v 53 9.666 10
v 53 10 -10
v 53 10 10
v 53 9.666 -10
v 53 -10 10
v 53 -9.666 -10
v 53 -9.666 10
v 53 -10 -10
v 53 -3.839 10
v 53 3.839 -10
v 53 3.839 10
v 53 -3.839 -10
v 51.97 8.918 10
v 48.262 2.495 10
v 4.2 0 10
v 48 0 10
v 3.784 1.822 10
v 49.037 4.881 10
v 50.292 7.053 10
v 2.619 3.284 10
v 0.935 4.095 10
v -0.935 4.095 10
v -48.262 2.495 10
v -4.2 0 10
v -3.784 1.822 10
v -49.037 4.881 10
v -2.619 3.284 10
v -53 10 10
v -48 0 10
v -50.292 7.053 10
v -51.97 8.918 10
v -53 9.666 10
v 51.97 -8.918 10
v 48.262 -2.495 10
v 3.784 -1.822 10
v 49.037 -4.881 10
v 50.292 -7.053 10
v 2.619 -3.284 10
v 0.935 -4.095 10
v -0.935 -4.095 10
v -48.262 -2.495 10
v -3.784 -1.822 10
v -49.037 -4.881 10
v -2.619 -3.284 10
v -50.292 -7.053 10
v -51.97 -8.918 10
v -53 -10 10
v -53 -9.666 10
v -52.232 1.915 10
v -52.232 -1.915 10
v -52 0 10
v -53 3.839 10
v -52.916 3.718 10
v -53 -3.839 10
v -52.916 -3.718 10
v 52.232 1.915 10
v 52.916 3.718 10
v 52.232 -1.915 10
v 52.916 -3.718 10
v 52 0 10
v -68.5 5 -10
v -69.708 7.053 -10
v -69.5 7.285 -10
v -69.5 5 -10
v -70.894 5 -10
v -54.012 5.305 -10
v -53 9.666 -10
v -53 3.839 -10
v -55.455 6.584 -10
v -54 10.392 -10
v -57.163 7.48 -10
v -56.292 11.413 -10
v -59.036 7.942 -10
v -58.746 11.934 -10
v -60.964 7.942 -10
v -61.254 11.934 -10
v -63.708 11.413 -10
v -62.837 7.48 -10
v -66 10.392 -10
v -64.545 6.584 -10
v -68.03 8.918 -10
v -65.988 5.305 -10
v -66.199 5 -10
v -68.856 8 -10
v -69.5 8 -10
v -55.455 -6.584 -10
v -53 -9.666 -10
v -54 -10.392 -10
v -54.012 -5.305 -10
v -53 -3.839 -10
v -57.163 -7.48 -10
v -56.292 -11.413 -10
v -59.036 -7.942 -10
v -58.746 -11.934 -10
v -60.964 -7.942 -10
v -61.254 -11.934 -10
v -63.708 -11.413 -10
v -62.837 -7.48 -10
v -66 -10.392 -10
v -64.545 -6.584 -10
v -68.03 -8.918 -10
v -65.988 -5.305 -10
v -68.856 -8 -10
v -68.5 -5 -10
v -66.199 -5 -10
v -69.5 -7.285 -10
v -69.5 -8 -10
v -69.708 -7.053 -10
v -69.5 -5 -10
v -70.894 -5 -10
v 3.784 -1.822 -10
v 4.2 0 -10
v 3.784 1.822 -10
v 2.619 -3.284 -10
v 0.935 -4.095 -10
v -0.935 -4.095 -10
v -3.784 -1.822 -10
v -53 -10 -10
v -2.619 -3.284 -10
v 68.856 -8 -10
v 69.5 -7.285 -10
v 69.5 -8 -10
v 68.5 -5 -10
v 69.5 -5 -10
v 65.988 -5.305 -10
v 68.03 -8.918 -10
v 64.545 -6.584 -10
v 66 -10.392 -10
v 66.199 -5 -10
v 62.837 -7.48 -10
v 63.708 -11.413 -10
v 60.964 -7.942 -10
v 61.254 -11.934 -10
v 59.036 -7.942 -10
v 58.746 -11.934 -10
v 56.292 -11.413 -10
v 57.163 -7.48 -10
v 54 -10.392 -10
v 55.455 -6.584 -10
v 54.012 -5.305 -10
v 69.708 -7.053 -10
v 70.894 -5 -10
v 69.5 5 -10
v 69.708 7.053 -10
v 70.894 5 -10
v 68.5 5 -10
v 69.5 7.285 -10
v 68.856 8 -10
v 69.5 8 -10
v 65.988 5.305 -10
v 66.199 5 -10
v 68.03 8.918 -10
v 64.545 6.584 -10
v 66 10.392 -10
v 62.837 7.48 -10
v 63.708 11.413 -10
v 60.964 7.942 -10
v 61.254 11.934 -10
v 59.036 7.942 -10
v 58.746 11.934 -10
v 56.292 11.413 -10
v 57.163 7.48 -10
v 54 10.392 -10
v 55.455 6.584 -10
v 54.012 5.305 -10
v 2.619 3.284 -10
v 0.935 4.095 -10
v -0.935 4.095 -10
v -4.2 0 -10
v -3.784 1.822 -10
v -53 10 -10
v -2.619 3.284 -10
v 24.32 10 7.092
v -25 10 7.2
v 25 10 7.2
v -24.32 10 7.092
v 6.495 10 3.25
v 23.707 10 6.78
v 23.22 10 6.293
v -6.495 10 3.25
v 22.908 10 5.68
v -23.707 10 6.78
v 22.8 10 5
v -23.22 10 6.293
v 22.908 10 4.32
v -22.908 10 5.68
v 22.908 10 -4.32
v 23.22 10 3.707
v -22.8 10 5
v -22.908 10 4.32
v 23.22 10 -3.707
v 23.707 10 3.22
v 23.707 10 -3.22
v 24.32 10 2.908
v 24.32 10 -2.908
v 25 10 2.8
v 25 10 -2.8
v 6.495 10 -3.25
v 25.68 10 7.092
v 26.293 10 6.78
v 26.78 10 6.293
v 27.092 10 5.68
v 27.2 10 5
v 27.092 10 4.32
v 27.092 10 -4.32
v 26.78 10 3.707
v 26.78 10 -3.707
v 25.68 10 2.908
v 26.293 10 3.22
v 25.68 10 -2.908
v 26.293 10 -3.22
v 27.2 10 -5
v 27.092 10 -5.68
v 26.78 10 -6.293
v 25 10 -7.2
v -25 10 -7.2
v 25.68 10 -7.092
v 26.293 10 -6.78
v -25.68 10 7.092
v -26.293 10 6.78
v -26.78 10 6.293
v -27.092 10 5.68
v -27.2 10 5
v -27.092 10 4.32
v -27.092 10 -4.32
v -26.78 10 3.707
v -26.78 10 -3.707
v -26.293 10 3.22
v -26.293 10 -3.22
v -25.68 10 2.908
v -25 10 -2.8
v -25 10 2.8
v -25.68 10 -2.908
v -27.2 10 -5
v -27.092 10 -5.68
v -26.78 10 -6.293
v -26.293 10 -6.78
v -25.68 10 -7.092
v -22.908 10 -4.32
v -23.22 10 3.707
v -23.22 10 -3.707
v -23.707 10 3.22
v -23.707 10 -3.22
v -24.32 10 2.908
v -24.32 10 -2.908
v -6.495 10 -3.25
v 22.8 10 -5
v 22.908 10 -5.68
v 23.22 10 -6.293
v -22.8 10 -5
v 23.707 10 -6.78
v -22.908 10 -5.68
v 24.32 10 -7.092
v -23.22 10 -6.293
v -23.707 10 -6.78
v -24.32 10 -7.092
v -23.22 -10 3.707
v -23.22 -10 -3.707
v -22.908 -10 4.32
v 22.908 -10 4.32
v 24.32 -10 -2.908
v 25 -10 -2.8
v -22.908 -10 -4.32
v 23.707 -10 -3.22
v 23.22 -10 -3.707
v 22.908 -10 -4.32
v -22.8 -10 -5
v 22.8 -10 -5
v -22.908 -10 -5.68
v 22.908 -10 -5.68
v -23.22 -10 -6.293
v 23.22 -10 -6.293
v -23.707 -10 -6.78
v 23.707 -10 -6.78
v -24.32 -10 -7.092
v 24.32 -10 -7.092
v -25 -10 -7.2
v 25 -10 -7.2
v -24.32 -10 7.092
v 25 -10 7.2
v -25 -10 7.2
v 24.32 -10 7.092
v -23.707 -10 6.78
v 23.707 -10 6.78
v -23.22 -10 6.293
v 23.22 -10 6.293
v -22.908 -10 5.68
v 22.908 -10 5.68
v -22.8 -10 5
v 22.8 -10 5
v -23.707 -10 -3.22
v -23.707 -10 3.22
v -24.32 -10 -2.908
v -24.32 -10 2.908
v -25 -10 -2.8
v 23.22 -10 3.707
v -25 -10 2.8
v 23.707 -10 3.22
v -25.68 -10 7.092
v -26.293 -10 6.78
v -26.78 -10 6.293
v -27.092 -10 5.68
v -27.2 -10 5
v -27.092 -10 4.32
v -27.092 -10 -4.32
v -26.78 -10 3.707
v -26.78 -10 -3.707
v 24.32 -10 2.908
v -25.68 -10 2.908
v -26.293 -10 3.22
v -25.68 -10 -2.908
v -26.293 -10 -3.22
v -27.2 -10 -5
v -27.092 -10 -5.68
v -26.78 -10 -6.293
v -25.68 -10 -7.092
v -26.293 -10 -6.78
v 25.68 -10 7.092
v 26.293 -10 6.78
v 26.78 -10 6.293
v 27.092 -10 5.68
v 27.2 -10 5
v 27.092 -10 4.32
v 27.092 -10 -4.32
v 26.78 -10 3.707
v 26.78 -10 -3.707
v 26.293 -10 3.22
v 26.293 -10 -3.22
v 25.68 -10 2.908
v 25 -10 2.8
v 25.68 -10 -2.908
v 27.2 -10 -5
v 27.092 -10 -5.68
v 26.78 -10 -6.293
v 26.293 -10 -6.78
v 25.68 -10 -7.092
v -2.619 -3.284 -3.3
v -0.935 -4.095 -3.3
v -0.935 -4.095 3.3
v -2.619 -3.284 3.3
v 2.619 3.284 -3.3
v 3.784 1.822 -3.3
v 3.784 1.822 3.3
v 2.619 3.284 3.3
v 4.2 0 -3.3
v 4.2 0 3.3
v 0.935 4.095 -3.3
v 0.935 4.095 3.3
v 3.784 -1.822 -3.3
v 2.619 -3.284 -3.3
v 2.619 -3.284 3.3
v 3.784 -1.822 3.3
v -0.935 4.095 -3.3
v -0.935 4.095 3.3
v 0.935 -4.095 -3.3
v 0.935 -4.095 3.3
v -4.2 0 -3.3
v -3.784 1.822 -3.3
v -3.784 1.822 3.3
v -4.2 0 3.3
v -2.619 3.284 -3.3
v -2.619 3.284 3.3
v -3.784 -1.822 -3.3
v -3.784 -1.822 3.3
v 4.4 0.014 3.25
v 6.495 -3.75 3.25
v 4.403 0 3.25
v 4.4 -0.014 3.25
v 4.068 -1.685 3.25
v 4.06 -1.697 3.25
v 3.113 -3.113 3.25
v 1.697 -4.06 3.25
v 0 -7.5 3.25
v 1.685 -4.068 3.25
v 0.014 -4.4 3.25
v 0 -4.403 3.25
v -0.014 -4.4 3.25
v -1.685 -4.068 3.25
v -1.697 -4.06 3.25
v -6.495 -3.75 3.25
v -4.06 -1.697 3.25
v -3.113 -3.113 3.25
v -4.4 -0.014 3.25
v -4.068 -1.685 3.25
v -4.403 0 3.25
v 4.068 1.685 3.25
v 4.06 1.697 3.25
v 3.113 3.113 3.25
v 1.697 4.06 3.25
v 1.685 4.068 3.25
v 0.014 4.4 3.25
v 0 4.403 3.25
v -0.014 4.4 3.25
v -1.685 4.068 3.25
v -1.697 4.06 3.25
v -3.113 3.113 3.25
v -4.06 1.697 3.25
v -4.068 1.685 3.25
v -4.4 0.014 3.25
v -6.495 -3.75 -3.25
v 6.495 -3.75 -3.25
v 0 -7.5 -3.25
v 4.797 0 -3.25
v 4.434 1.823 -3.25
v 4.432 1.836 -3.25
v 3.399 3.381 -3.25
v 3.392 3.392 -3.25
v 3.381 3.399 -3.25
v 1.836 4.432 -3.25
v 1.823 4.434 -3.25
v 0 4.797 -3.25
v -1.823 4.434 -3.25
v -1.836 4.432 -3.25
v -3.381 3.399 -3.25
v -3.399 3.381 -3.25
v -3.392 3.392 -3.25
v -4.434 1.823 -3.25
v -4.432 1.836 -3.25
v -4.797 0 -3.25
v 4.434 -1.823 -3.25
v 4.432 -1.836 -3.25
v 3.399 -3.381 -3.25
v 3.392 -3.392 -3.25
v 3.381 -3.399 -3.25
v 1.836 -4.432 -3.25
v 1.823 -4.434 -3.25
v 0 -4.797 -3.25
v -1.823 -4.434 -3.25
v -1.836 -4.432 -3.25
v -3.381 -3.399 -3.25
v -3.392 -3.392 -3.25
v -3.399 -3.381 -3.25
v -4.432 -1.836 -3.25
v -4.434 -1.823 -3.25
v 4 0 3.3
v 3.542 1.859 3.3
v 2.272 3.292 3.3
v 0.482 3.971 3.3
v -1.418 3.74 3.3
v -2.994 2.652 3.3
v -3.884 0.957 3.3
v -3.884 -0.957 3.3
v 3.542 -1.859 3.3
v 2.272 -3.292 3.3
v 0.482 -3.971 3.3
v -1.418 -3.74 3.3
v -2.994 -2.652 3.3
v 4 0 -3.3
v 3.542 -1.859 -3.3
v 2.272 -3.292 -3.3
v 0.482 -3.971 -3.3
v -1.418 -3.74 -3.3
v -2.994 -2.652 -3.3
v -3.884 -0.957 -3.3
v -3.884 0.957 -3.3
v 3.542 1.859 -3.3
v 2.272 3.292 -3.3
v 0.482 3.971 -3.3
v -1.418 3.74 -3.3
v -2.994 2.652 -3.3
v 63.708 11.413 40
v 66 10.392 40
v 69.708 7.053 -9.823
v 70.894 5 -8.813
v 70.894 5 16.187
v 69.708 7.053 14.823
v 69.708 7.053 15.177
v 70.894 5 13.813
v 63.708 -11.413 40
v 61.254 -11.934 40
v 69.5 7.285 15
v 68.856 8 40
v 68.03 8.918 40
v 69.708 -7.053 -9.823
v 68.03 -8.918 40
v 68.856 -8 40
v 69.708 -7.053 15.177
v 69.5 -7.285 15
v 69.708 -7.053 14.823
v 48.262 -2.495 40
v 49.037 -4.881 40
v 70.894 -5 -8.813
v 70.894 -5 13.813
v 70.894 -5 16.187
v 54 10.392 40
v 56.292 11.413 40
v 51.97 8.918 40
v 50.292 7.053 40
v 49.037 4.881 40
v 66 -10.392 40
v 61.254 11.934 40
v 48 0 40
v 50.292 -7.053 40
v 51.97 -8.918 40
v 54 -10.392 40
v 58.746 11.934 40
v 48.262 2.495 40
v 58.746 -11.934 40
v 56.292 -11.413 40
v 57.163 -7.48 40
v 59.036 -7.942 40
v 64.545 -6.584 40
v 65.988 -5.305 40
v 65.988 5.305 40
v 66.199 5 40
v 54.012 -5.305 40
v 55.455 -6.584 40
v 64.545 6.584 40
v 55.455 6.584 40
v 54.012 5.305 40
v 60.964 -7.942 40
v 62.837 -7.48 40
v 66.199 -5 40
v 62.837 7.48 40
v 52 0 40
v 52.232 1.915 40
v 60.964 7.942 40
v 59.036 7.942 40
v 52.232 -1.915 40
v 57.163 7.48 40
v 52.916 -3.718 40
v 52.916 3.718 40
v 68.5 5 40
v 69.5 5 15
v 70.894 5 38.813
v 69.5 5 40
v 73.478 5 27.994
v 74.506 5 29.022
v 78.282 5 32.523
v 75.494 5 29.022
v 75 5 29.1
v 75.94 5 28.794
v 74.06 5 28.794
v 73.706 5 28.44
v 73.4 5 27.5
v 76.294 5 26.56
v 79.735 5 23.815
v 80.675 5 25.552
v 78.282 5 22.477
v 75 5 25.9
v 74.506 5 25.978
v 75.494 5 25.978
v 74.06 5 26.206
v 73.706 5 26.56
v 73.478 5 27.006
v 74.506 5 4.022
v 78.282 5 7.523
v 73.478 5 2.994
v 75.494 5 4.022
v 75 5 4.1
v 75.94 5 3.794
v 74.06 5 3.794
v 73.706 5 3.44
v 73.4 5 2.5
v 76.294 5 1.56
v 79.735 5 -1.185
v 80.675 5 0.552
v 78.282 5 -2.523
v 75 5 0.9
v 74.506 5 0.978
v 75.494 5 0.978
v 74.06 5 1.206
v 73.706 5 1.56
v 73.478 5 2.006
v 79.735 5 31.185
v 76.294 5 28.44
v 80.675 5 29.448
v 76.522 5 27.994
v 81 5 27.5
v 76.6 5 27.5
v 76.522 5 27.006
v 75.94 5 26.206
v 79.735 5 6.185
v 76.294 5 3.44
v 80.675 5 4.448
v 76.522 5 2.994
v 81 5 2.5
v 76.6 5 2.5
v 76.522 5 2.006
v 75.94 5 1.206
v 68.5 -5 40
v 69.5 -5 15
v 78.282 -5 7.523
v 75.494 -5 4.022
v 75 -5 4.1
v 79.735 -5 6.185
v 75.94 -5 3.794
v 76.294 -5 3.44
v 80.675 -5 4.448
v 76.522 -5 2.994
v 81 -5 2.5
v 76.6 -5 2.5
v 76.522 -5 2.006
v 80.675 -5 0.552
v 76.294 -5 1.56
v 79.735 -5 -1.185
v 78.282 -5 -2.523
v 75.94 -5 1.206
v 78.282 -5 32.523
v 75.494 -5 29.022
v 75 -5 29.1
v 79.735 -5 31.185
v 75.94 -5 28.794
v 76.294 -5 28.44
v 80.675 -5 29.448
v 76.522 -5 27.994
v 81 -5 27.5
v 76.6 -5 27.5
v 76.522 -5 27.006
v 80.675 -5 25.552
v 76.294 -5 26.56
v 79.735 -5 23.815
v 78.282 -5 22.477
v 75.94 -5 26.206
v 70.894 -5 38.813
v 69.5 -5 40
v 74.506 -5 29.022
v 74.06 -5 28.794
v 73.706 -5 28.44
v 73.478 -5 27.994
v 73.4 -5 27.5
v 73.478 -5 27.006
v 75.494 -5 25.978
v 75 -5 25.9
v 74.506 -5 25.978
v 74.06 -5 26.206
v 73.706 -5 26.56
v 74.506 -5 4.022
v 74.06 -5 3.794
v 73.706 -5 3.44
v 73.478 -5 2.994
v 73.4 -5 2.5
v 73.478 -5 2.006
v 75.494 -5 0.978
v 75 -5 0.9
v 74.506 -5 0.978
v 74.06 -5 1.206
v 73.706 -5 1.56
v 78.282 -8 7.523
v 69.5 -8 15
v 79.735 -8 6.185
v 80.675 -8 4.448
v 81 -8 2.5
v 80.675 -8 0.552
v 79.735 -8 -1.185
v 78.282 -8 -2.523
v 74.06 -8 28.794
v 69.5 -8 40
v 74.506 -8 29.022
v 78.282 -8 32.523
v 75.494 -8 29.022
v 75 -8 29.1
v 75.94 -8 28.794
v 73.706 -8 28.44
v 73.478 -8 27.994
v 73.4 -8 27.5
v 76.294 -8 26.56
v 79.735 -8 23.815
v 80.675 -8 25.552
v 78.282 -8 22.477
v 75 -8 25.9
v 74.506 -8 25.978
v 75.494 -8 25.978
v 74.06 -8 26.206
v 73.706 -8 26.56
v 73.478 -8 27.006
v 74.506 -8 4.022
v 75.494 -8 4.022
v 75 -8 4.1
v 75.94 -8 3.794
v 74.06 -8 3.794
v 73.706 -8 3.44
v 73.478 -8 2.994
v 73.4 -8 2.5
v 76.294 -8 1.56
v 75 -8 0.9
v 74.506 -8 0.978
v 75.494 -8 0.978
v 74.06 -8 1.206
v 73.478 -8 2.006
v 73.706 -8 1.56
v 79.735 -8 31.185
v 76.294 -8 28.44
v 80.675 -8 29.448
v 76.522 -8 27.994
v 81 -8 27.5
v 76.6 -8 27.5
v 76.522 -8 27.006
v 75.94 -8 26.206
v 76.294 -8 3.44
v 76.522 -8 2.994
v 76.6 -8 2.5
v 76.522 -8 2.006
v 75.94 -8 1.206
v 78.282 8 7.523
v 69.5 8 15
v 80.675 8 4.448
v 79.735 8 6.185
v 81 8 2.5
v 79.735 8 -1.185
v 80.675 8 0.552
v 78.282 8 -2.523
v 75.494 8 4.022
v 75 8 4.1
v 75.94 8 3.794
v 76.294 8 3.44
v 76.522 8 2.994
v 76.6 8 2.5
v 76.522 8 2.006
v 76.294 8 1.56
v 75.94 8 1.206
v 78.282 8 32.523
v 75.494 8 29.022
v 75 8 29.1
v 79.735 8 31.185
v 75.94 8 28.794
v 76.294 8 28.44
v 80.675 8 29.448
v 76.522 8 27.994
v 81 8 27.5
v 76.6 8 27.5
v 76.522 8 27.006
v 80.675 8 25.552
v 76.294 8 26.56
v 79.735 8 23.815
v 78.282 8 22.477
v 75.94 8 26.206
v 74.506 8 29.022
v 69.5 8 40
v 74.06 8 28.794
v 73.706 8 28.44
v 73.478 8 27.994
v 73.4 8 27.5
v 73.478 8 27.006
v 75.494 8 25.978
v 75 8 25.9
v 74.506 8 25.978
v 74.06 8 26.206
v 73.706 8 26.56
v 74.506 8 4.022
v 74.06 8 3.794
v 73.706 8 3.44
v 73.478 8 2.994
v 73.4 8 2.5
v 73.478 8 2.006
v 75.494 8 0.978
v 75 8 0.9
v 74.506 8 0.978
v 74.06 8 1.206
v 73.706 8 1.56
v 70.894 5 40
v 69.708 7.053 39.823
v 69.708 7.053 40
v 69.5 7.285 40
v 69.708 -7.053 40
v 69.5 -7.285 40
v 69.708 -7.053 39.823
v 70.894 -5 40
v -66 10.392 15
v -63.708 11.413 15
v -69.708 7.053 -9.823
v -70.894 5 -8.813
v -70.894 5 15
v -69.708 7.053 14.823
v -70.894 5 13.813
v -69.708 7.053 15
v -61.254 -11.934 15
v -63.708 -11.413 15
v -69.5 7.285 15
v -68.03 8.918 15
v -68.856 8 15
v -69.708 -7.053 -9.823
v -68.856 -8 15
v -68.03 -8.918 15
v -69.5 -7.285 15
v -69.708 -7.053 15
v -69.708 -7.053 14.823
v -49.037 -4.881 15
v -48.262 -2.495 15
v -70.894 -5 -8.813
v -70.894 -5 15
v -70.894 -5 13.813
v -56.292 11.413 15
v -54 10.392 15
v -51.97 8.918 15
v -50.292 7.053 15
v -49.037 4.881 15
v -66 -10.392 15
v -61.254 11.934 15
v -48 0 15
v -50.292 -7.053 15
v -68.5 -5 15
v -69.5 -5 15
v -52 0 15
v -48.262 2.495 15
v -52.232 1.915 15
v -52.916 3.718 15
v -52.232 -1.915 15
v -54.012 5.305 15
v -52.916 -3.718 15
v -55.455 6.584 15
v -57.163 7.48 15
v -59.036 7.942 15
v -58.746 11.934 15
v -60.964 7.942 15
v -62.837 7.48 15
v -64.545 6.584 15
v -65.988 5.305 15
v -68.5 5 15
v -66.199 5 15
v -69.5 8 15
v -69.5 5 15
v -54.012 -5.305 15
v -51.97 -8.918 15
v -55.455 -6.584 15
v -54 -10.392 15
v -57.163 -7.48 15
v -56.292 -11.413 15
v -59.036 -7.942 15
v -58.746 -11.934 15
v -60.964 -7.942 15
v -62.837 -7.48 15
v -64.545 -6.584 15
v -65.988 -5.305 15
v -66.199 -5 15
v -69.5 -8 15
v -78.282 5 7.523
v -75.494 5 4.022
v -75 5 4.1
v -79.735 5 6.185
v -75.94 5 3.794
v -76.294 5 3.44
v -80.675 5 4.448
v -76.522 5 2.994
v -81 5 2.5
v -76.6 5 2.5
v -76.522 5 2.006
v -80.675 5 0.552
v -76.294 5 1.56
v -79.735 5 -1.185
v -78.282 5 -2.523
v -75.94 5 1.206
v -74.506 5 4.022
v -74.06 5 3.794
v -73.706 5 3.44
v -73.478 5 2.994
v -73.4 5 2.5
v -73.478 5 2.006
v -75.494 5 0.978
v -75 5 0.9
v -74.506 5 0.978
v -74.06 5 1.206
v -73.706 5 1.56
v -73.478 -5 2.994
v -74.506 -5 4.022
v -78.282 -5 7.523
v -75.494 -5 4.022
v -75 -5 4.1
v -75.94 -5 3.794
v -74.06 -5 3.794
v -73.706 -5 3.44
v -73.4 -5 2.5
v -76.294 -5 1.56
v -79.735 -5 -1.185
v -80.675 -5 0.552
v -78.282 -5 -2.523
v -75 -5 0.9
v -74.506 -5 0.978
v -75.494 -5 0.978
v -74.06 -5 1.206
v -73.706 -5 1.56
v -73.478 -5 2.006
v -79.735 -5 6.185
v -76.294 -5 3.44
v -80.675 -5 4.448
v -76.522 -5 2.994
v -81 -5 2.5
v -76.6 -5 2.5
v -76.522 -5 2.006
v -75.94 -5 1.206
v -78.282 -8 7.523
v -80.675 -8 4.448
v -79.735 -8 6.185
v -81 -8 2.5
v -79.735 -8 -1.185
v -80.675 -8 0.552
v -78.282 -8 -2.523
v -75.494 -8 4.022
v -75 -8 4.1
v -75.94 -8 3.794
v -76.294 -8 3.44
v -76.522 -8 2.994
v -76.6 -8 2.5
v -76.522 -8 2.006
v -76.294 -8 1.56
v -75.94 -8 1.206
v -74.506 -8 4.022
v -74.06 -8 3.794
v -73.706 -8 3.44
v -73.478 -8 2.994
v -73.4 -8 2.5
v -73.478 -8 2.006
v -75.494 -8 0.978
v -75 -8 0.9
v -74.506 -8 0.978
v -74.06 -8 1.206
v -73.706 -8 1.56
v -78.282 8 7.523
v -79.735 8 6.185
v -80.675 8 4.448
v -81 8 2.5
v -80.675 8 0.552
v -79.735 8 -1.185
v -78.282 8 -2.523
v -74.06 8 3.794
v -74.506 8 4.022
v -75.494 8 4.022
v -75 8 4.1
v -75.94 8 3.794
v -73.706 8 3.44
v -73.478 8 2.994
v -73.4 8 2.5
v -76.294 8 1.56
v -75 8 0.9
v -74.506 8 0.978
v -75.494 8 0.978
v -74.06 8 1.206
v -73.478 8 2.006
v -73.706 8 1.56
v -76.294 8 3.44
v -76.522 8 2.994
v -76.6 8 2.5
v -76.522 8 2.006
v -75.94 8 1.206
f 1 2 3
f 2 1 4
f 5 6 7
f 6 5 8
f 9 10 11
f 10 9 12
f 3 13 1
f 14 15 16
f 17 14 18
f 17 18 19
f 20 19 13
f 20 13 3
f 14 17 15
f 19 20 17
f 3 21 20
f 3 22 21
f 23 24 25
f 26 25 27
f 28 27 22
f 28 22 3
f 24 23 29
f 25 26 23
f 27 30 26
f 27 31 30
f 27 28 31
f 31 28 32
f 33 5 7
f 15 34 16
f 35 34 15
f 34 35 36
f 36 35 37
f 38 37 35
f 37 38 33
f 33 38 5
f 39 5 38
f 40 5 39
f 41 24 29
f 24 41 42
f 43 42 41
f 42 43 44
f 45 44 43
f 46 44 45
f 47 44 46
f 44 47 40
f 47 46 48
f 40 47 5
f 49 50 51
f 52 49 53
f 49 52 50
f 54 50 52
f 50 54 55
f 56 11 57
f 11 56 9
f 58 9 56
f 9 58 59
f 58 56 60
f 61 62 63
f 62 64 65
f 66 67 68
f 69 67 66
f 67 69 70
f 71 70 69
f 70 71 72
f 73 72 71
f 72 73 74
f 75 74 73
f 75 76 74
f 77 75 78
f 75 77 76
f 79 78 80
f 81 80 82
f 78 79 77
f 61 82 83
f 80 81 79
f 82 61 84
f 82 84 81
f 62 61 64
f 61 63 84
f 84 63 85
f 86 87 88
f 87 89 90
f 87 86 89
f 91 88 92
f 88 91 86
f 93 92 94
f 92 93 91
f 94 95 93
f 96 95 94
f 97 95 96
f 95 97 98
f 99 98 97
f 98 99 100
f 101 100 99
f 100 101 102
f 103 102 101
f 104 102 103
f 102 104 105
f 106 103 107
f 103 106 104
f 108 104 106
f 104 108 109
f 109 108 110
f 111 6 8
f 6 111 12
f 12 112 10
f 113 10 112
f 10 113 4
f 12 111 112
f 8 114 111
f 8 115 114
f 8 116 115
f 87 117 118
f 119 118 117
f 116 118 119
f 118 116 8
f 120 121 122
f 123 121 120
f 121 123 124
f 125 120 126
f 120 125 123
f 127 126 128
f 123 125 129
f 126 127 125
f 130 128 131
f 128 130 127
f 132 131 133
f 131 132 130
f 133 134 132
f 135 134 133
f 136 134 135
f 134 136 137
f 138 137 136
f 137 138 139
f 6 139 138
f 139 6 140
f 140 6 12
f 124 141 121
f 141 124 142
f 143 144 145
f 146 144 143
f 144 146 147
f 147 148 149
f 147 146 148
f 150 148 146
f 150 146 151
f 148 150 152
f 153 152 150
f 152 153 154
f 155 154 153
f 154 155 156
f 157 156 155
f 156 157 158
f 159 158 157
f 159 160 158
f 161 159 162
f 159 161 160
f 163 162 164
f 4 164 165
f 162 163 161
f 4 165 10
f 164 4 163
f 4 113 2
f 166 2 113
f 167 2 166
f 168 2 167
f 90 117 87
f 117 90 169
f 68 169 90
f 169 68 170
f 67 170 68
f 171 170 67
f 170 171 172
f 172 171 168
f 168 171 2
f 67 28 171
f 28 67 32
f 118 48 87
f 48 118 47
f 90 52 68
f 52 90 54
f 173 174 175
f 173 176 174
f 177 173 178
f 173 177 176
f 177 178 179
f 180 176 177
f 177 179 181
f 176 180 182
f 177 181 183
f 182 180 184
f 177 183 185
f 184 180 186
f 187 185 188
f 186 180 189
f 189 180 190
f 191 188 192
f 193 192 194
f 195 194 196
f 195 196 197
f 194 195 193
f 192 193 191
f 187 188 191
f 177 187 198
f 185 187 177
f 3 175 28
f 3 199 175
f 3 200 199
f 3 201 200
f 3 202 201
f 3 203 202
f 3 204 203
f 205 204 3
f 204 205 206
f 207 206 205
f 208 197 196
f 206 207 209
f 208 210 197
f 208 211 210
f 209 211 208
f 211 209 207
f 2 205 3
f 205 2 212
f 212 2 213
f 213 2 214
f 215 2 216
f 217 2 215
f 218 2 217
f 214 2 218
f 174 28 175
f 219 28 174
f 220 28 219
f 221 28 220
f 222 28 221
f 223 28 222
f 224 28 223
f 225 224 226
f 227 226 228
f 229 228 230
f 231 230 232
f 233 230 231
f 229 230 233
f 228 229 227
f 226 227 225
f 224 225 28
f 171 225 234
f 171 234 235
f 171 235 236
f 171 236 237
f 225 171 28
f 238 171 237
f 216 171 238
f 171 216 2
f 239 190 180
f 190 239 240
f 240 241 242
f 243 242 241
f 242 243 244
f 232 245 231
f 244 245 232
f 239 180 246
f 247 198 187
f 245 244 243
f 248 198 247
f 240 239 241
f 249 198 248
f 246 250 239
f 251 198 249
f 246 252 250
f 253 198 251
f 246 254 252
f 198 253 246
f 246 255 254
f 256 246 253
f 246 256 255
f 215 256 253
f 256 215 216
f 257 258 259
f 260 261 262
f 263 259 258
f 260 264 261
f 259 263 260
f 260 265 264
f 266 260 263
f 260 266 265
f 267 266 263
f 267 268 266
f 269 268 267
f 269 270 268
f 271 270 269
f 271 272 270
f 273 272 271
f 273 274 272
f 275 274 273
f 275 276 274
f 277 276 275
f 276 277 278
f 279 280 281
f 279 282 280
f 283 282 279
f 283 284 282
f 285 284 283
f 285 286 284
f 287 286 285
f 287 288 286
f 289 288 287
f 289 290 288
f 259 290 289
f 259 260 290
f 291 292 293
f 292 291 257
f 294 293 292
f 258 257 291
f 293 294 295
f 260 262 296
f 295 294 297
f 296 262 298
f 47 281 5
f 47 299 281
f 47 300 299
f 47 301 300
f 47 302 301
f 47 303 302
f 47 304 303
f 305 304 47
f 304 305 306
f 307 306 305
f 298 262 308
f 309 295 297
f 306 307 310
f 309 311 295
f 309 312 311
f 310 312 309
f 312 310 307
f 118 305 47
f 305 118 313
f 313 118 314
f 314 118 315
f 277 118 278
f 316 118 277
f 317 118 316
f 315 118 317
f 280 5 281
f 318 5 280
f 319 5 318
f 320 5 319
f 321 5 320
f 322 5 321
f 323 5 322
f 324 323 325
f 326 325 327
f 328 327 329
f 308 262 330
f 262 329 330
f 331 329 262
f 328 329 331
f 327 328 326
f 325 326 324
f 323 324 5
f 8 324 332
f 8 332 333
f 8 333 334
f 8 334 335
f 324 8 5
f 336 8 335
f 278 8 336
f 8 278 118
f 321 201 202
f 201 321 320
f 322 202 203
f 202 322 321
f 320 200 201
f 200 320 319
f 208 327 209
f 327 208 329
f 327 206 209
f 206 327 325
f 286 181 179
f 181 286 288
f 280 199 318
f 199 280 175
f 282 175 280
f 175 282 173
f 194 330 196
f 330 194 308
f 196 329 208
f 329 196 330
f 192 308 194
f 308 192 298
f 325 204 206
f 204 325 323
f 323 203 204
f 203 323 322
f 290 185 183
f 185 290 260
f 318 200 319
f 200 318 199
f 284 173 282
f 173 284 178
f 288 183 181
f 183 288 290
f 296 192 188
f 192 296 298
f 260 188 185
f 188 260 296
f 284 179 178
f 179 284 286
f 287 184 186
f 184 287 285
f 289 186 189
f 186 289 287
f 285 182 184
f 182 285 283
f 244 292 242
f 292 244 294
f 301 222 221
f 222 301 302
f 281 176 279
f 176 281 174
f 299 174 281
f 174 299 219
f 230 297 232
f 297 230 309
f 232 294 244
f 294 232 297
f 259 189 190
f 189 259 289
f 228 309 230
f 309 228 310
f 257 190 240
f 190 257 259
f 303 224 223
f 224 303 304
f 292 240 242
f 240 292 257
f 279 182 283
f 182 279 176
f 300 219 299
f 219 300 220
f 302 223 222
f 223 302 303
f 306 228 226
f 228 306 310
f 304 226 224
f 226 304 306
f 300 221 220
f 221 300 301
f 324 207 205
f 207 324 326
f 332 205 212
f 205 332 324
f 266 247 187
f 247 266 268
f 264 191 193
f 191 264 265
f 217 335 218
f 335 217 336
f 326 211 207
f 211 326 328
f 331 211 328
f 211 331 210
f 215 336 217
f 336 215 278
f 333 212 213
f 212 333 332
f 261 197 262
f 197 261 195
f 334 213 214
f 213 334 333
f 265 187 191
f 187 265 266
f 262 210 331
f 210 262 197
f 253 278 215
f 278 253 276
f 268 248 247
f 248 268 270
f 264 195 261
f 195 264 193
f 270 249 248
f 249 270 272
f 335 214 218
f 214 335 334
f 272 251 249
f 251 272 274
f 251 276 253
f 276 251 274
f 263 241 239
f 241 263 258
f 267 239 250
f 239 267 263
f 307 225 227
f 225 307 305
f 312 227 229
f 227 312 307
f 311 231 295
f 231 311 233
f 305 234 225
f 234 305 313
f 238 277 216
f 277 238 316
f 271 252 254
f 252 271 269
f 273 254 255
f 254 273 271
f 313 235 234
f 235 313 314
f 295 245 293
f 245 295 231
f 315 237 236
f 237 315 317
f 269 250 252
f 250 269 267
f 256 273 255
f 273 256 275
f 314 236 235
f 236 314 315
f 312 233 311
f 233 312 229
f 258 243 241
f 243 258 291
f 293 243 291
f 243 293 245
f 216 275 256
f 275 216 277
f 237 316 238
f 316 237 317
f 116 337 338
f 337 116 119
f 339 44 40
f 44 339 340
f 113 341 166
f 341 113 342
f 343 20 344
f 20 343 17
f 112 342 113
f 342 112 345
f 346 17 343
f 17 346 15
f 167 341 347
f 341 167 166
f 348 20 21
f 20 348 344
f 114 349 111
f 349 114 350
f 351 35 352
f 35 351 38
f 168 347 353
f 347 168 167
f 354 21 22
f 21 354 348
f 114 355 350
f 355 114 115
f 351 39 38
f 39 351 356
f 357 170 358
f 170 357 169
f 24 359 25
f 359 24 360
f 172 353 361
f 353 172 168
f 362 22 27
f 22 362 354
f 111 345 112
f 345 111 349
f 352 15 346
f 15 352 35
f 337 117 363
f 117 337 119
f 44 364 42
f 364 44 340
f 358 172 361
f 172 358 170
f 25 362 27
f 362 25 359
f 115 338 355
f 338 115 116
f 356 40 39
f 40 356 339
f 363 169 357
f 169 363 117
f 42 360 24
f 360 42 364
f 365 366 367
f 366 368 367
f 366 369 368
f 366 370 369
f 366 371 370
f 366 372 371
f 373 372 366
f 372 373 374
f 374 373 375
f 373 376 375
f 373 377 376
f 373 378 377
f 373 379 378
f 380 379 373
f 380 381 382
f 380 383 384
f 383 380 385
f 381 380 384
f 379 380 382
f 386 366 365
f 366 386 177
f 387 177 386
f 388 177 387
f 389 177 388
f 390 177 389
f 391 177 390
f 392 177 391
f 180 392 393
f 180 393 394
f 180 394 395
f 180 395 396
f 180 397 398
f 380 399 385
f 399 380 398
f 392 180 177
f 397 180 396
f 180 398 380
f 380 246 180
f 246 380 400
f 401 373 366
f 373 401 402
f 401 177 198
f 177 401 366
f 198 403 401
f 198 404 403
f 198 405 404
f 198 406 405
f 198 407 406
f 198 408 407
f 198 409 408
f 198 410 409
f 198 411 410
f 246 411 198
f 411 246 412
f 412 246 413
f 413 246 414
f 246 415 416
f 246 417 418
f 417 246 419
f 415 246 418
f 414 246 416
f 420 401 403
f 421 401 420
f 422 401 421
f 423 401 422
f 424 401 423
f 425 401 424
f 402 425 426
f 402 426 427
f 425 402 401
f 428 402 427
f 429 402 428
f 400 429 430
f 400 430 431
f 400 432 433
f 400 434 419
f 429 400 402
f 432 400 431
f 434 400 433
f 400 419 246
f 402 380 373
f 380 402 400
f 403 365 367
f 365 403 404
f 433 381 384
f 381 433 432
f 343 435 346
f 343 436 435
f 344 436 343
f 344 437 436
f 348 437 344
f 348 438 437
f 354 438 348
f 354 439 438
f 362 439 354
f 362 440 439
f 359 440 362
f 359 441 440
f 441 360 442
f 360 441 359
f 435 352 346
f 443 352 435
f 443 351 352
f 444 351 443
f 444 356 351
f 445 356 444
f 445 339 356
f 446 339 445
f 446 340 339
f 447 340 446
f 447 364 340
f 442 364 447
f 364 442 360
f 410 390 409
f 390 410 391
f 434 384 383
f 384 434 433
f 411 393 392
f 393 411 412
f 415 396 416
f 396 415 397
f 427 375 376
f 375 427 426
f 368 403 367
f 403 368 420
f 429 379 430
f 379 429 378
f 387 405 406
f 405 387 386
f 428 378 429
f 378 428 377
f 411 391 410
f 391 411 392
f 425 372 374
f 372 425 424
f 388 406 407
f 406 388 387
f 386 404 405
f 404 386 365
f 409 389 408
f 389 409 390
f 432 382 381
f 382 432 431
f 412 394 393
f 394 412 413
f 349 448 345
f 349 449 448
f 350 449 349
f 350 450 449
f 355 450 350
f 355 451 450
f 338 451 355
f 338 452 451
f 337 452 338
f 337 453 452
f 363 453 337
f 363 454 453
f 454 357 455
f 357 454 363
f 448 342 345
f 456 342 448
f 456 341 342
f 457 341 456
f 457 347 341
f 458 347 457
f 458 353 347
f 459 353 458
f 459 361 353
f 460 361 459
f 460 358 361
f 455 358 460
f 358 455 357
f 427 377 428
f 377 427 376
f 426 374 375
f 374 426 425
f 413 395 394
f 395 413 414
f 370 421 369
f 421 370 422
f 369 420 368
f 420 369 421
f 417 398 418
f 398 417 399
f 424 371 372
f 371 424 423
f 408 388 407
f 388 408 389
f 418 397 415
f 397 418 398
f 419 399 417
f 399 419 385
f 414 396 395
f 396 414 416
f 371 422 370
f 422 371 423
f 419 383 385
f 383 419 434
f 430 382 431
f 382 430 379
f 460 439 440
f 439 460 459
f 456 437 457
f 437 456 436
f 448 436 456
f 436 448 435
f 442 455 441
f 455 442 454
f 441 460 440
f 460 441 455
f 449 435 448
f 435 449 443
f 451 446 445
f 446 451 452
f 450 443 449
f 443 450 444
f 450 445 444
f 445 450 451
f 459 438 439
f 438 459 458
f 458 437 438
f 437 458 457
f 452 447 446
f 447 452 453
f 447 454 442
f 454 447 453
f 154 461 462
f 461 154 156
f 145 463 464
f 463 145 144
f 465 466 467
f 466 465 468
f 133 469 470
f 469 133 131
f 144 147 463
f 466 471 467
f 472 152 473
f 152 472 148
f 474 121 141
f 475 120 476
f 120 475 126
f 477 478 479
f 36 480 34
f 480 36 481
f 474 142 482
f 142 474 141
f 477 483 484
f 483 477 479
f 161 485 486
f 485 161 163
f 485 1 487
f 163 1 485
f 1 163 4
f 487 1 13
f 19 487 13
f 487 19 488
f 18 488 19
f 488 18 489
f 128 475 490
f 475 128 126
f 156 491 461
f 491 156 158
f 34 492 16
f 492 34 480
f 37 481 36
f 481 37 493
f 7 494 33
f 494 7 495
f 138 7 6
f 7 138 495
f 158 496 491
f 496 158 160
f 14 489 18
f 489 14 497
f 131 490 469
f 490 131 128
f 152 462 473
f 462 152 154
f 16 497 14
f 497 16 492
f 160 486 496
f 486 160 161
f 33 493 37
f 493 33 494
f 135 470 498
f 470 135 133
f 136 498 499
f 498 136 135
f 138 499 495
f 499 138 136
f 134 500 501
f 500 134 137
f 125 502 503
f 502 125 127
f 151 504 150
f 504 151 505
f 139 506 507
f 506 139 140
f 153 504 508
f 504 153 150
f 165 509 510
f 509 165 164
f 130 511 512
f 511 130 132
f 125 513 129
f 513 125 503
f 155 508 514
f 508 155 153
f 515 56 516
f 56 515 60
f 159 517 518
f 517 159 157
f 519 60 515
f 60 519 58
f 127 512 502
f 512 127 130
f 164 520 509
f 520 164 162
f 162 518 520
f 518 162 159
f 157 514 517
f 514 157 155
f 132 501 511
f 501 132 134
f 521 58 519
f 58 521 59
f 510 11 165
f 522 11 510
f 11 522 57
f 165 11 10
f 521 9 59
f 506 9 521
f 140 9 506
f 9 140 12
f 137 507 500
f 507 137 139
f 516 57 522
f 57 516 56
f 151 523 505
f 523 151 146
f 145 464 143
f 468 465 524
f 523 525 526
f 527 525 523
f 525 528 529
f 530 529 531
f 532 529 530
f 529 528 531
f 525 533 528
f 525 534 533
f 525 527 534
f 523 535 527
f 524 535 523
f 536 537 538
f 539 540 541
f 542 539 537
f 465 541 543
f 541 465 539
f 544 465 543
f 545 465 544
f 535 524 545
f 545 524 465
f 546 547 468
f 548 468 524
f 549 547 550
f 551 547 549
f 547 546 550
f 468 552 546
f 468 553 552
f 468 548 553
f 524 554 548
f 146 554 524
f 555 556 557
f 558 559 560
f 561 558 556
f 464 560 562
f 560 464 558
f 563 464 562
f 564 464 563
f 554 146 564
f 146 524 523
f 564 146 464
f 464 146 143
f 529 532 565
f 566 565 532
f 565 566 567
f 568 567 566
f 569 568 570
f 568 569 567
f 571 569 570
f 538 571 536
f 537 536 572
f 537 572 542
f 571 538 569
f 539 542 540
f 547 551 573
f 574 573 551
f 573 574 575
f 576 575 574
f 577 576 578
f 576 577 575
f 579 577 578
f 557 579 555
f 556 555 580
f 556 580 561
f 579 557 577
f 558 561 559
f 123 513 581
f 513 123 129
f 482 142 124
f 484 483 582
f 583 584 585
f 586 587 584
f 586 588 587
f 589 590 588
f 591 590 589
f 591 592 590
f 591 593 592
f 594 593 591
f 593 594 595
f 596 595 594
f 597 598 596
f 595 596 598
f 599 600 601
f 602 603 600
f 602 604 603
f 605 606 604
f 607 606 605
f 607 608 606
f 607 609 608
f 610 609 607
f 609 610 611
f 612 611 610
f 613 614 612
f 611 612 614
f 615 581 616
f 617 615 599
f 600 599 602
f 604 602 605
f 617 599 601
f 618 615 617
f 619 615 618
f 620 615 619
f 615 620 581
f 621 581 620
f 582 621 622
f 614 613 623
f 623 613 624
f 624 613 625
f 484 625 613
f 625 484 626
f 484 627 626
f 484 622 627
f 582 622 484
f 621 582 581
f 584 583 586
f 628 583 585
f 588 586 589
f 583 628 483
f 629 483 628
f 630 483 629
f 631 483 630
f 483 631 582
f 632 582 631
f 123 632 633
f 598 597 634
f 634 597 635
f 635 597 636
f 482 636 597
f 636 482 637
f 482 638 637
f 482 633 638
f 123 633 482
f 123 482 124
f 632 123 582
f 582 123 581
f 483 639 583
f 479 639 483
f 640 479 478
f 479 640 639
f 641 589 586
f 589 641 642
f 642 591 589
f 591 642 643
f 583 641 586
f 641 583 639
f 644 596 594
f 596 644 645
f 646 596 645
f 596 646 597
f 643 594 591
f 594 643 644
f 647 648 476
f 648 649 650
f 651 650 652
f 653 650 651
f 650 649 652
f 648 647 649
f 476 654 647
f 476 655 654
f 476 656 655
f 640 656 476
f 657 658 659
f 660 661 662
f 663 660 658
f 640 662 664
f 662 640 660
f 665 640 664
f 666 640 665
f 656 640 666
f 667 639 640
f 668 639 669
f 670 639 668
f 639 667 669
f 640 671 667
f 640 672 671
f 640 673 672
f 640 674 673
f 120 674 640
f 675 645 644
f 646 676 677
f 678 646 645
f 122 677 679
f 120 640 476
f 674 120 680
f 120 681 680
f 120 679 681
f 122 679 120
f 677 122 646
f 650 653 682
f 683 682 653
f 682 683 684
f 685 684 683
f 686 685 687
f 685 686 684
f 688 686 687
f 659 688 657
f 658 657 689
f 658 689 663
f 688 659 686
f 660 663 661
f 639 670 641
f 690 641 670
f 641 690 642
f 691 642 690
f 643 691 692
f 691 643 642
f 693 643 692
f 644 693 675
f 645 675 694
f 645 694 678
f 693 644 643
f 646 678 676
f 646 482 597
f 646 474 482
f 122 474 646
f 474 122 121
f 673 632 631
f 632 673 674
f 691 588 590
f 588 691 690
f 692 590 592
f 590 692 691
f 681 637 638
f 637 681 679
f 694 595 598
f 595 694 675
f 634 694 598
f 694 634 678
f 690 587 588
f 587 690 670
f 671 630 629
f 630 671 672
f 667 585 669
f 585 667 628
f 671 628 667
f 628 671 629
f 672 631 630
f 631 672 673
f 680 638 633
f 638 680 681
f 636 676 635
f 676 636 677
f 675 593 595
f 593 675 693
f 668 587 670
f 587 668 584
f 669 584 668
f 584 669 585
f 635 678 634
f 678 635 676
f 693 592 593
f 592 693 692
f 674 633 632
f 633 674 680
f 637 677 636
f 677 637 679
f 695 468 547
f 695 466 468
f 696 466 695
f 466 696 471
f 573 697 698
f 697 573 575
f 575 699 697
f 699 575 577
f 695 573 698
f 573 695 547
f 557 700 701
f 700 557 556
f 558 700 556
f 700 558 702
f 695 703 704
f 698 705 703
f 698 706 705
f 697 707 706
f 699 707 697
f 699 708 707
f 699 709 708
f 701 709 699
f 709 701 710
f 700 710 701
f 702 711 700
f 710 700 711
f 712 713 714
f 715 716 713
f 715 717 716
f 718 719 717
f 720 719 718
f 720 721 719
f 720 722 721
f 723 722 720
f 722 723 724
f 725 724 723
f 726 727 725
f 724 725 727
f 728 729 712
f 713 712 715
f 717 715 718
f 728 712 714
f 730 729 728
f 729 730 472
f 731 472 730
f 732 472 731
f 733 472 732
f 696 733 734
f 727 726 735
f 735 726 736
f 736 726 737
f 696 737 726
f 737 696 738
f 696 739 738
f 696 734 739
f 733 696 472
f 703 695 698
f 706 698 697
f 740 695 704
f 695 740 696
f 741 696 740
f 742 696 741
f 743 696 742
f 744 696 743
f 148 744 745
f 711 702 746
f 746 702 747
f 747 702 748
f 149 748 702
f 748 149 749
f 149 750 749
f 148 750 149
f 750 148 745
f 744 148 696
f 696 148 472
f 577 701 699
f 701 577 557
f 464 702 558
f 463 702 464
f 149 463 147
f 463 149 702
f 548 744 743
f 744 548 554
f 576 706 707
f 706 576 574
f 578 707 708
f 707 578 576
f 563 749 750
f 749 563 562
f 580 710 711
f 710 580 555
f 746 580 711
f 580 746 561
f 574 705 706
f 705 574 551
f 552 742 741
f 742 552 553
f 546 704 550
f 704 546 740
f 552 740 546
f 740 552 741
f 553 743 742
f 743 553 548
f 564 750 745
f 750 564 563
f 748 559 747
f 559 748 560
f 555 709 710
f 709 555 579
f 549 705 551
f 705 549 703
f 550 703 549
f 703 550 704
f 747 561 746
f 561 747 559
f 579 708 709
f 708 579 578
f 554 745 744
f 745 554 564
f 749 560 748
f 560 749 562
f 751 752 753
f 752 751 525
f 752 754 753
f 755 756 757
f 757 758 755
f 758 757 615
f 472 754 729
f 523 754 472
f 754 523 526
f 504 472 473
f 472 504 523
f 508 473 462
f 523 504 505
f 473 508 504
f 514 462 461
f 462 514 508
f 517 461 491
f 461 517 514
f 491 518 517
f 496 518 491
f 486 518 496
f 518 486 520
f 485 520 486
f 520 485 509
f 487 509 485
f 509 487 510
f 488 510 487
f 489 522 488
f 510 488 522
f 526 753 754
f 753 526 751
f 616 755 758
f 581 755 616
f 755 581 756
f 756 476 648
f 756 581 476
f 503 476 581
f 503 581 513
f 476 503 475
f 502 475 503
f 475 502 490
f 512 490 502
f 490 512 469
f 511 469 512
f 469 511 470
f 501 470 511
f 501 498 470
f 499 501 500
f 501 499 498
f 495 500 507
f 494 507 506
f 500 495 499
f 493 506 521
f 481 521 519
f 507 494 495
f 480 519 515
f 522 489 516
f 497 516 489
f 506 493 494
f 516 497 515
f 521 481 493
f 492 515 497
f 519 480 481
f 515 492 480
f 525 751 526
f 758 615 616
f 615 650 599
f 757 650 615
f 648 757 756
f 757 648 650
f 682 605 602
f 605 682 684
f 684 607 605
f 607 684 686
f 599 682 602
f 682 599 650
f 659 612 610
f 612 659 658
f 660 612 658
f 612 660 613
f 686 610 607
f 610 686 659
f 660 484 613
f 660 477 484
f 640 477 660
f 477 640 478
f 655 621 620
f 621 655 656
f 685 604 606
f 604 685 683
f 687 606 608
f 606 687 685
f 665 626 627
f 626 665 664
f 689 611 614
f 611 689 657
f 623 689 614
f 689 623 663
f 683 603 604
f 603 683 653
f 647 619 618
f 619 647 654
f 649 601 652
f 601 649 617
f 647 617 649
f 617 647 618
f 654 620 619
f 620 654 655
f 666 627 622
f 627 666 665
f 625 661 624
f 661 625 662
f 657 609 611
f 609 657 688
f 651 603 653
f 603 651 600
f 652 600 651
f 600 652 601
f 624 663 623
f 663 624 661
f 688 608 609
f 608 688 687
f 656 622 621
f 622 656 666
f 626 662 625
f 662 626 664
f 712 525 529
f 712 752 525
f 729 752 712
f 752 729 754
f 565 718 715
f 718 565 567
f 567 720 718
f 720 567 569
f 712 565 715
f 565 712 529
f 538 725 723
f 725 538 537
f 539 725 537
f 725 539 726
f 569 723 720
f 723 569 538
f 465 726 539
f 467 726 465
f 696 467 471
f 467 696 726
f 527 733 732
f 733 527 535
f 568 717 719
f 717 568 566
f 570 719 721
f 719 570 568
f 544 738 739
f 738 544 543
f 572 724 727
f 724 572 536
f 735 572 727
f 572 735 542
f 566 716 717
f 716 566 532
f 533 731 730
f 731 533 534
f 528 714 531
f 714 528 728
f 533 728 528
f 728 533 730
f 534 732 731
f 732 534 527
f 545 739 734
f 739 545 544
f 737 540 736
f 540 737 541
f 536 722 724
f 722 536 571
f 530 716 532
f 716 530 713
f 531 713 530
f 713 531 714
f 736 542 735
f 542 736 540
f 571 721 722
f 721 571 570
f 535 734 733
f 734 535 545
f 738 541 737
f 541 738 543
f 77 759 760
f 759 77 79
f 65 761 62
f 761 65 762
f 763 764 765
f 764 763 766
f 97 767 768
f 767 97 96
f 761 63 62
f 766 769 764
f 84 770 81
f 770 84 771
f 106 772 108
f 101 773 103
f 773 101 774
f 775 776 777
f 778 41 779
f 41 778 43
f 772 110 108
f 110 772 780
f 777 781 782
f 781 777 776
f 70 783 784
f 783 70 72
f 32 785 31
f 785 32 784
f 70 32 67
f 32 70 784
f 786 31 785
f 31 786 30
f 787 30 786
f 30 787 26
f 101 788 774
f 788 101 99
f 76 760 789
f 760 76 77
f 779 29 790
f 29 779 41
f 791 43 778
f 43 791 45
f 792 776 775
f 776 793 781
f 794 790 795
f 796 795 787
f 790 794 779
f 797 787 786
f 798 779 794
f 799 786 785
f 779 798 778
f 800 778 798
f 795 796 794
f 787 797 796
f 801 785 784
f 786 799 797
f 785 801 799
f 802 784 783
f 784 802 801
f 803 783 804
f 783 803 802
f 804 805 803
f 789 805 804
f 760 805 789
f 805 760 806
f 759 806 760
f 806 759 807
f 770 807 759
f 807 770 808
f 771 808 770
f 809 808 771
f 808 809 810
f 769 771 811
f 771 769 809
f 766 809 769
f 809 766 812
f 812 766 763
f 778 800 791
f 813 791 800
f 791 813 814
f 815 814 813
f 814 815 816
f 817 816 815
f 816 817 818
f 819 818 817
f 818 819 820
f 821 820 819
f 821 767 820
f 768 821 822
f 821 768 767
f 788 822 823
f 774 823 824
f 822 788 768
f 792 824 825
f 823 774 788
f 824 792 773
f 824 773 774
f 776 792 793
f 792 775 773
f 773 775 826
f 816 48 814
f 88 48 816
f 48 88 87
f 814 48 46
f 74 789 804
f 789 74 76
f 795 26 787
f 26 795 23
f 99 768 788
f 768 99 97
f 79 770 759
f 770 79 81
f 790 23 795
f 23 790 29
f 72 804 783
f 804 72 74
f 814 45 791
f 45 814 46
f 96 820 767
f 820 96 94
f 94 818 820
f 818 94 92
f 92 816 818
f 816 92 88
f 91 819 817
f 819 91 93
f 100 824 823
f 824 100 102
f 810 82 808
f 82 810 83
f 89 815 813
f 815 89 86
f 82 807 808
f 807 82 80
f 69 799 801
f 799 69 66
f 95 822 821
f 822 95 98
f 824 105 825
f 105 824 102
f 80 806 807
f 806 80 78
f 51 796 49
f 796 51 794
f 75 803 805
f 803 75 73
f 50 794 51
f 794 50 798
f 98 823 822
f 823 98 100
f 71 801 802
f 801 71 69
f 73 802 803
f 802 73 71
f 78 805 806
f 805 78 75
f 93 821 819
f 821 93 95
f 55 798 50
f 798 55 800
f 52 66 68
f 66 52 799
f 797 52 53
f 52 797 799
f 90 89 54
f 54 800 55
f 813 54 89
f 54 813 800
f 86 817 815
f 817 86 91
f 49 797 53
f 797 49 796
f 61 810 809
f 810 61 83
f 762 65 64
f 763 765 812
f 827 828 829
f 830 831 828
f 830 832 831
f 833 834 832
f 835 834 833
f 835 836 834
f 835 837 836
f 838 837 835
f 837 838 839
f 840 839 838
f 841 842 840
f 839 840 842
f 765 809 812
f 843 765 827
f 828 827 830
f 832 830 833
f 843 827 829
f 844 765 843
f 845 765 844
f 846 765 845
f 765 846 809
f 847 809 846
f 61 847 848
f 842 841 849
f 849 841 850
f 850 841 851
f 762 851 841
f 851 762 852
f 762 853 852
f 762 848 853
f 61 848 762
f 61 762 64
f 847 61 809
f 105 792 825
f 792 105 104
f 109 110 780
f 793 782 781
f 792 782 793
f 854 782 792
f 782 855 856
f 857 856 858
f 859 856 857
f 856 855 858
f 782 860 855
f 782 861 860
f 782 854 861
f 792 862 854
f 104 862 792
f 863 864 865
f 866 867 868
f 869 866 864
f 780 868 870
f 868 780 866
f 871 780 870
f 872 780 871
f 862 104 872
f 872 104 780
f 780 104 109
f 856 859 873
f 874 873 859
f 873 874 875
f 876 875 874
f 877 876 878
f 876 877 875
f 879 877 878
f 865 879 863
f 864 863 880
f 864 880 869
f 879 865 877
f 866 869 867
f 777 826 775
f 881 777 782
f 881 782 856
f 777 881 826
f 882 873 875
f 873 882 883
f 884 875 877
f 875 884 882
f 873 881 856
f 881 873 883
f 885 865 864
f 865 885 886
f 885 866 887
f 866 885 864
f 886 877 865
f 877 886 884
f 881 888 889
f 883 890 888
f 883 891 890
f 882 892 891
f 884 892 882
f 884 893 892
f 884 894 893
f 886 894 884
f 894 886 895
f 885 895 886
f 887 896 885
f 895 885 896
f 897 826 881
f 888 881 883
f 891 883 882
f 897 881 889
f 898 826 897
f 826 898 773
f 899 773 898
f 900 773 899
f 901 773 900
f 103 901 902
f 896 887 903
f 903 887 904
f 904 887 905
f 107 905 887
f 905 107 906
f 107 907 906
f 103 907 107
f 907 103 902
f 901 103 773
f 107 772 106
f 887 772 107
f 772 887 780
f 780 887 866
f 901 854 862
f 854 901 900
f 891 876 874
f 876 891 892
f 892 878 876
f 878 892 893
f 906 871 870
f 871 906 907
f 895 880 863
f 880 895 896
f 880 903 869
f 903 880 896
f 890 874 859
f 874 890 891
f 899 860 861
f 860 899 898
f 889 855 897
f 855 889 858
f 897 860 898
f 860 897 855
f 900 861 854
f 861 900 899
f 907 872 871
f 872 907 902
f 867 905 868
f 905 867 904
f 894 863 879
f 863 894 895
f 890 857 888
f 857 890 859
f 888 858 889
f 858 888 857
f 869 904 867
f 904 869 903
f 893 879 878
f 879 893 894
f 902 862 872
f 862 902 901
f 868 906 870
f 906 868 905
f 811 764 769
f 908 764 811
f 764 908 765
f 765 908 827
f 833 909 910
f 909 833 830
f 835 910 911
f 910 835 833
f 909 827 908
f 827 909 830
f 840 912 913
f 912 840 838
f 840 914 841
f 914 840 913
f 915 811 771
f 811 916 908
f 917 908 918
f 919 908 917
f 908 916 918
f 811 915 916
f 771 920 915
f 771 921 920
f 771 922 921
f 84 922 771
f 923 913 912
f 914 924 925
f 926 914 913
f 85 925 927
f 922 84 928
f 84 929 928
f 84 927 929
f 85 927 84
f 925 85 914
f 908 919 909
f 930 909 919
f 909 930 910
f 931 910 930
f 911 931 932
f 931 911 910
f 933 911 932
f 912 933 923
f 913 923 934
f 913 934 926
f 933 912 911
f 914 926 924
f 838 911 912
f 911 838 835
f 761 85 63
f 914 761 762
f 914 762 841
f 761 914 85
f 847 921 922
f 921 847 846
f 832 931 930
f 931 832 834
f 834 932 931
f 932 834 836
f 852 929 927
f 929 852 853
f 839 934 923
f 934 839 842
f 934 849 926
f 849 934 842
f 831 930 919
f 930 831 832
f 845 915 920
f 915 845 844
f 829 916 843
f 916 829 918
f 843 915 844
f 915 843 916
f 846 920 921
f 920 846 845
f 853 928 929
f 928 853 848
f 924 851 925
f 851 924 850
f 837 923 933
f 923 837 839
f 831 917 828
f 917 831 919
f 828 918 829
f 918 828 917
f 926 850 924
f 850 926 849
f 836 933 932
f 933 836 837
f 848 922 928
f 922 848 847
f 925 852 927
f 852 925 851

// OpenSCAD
///////////////////////////////////////////////////////////////////////////////
//                                                                           //
//                       MaduixaCNC - BCN Dynamics                           //
//                                                                           //
///////////////////////////////////////////////////////////////////////////////
//
// File: z-carriage-CNC
//
// Authors: Victor Sapena <victor@bcndynamics.com>,
//          Daniel Díaz <dani@bcndynamics.com>,
//          Emili Sapena <emili@bcndynamics.com>
//
// Copyright (c) 2015 by the original authors.
//
// This file is part of MaduixaCNC.
// 
// MaduixaCNC is free: you can redistribute it and/or modify
// it under the terms of the GNU General Public License as published by
// the Free Software Foundation, either version 3 of the License, or
// (at your option) any later version.
// 
// MaduixaCNC is distributed in the hope that it will be useful,
// but WITHOUT ANY WARRANTY; without even the implied warranty of
// MERCHANTABILITY or FITNESS FOR A PARTICULAR PURPOSE.  See the
// GNU General Public License for more details.
// 
// You should have received a copy of the GNU General Public License
// along with MaduixaCNC.  If not, see <http://www.gnu.org/licenses/>.
//
// http://bcndynamics.com 
///////////////////////////////////////////////////////////////////////////////

///////////////////////////////////////////////////////////////////////////////
// Variables

height=25;

///////////////////////////////////////////////////////////////////////////////
// Modules

// bearing
module rodament(height=height)
{
  difference(){
    cylinder(r=12,h=height,center=true);
    cylinder(r=8, h =height+2,center=true);
    translate([10,0,0])
    cube([20,10,height+2],center=true);
  }

  translate([15,-6.5,0]){
    difference(){

      hull(){
	translate([-6,0,-height/2+0.5])
	cube([1,3,1],center=true);

	rotate([90,0,0])
	cylinder( r=6,h=3,center=true);

	translate([-6,0,height/2-0.5])
	cube([1,3,1],center=true);
	
      }//hull
	
      rotate([90,0,0])
      cylinder( r=1.6,h=4, $fn=20 ,center=true);
    }//difference
  }//translate

  translate([15,6.5,0]){
    difference(){
      hull(){
	translate([-6,0,-height/2+0.5])
	cube([1,3,1],center=true);

	rotate([90,0,0])
	cylinder( r=6,h=3,center=true);

	translate([-6,0,height/2-0.5])
	cube([1,3,1],center=true);
      }//hull
      
      rotate([90,0,0])
      cylinder( r=1.6,h=4, $fn=20 ,center=true);
      
    }//difference

  }//translate

}

///////////////////////////////////////////////////////////////////////////////
// Main

difference(){
  cube([106,20,20],center=true);
  
  rotate([90,0,0])
    translate([25,5,0])
      cylinder(r = 2.2,h=30,$fn=20,center=true);

  rotate([90,0,0])
    translate([-25,5,0])
      cylinder(r = 2.2,h=30,$fn=20,center=true);

  rotate([90,0,0])
    translate([25,-5,0])
      cylinder(r = 2.2,h=30,$fn=20,center=true);

  rotate([90,0,0])
    translate([-25,-5,0])
      cylinder(r = 2.2,h=30,$fn=20,center=true);

  cylinder(r=4.2,h=26,center=true);

  rotate([0,0,90]){
    hull(){
      cylinder(r=7.5,h=6.5,$fn=6,center=true);
      translate([20,0,0])
	cylinder(r=7.5,h=6.5,$fn=6,center=true);
    }
  }
}

difference(){
  cylinder(r1=4.8,r2= 4.4,h=6.6,center=true);
  cylinder(r1=4,r2= 4,h=7,center=true);
}

translate([60,0,2.5])
  rodament();

translate([60,0,27.5])
  rodament();

translate([-60,0,2.5])
  mirror() rodament();
